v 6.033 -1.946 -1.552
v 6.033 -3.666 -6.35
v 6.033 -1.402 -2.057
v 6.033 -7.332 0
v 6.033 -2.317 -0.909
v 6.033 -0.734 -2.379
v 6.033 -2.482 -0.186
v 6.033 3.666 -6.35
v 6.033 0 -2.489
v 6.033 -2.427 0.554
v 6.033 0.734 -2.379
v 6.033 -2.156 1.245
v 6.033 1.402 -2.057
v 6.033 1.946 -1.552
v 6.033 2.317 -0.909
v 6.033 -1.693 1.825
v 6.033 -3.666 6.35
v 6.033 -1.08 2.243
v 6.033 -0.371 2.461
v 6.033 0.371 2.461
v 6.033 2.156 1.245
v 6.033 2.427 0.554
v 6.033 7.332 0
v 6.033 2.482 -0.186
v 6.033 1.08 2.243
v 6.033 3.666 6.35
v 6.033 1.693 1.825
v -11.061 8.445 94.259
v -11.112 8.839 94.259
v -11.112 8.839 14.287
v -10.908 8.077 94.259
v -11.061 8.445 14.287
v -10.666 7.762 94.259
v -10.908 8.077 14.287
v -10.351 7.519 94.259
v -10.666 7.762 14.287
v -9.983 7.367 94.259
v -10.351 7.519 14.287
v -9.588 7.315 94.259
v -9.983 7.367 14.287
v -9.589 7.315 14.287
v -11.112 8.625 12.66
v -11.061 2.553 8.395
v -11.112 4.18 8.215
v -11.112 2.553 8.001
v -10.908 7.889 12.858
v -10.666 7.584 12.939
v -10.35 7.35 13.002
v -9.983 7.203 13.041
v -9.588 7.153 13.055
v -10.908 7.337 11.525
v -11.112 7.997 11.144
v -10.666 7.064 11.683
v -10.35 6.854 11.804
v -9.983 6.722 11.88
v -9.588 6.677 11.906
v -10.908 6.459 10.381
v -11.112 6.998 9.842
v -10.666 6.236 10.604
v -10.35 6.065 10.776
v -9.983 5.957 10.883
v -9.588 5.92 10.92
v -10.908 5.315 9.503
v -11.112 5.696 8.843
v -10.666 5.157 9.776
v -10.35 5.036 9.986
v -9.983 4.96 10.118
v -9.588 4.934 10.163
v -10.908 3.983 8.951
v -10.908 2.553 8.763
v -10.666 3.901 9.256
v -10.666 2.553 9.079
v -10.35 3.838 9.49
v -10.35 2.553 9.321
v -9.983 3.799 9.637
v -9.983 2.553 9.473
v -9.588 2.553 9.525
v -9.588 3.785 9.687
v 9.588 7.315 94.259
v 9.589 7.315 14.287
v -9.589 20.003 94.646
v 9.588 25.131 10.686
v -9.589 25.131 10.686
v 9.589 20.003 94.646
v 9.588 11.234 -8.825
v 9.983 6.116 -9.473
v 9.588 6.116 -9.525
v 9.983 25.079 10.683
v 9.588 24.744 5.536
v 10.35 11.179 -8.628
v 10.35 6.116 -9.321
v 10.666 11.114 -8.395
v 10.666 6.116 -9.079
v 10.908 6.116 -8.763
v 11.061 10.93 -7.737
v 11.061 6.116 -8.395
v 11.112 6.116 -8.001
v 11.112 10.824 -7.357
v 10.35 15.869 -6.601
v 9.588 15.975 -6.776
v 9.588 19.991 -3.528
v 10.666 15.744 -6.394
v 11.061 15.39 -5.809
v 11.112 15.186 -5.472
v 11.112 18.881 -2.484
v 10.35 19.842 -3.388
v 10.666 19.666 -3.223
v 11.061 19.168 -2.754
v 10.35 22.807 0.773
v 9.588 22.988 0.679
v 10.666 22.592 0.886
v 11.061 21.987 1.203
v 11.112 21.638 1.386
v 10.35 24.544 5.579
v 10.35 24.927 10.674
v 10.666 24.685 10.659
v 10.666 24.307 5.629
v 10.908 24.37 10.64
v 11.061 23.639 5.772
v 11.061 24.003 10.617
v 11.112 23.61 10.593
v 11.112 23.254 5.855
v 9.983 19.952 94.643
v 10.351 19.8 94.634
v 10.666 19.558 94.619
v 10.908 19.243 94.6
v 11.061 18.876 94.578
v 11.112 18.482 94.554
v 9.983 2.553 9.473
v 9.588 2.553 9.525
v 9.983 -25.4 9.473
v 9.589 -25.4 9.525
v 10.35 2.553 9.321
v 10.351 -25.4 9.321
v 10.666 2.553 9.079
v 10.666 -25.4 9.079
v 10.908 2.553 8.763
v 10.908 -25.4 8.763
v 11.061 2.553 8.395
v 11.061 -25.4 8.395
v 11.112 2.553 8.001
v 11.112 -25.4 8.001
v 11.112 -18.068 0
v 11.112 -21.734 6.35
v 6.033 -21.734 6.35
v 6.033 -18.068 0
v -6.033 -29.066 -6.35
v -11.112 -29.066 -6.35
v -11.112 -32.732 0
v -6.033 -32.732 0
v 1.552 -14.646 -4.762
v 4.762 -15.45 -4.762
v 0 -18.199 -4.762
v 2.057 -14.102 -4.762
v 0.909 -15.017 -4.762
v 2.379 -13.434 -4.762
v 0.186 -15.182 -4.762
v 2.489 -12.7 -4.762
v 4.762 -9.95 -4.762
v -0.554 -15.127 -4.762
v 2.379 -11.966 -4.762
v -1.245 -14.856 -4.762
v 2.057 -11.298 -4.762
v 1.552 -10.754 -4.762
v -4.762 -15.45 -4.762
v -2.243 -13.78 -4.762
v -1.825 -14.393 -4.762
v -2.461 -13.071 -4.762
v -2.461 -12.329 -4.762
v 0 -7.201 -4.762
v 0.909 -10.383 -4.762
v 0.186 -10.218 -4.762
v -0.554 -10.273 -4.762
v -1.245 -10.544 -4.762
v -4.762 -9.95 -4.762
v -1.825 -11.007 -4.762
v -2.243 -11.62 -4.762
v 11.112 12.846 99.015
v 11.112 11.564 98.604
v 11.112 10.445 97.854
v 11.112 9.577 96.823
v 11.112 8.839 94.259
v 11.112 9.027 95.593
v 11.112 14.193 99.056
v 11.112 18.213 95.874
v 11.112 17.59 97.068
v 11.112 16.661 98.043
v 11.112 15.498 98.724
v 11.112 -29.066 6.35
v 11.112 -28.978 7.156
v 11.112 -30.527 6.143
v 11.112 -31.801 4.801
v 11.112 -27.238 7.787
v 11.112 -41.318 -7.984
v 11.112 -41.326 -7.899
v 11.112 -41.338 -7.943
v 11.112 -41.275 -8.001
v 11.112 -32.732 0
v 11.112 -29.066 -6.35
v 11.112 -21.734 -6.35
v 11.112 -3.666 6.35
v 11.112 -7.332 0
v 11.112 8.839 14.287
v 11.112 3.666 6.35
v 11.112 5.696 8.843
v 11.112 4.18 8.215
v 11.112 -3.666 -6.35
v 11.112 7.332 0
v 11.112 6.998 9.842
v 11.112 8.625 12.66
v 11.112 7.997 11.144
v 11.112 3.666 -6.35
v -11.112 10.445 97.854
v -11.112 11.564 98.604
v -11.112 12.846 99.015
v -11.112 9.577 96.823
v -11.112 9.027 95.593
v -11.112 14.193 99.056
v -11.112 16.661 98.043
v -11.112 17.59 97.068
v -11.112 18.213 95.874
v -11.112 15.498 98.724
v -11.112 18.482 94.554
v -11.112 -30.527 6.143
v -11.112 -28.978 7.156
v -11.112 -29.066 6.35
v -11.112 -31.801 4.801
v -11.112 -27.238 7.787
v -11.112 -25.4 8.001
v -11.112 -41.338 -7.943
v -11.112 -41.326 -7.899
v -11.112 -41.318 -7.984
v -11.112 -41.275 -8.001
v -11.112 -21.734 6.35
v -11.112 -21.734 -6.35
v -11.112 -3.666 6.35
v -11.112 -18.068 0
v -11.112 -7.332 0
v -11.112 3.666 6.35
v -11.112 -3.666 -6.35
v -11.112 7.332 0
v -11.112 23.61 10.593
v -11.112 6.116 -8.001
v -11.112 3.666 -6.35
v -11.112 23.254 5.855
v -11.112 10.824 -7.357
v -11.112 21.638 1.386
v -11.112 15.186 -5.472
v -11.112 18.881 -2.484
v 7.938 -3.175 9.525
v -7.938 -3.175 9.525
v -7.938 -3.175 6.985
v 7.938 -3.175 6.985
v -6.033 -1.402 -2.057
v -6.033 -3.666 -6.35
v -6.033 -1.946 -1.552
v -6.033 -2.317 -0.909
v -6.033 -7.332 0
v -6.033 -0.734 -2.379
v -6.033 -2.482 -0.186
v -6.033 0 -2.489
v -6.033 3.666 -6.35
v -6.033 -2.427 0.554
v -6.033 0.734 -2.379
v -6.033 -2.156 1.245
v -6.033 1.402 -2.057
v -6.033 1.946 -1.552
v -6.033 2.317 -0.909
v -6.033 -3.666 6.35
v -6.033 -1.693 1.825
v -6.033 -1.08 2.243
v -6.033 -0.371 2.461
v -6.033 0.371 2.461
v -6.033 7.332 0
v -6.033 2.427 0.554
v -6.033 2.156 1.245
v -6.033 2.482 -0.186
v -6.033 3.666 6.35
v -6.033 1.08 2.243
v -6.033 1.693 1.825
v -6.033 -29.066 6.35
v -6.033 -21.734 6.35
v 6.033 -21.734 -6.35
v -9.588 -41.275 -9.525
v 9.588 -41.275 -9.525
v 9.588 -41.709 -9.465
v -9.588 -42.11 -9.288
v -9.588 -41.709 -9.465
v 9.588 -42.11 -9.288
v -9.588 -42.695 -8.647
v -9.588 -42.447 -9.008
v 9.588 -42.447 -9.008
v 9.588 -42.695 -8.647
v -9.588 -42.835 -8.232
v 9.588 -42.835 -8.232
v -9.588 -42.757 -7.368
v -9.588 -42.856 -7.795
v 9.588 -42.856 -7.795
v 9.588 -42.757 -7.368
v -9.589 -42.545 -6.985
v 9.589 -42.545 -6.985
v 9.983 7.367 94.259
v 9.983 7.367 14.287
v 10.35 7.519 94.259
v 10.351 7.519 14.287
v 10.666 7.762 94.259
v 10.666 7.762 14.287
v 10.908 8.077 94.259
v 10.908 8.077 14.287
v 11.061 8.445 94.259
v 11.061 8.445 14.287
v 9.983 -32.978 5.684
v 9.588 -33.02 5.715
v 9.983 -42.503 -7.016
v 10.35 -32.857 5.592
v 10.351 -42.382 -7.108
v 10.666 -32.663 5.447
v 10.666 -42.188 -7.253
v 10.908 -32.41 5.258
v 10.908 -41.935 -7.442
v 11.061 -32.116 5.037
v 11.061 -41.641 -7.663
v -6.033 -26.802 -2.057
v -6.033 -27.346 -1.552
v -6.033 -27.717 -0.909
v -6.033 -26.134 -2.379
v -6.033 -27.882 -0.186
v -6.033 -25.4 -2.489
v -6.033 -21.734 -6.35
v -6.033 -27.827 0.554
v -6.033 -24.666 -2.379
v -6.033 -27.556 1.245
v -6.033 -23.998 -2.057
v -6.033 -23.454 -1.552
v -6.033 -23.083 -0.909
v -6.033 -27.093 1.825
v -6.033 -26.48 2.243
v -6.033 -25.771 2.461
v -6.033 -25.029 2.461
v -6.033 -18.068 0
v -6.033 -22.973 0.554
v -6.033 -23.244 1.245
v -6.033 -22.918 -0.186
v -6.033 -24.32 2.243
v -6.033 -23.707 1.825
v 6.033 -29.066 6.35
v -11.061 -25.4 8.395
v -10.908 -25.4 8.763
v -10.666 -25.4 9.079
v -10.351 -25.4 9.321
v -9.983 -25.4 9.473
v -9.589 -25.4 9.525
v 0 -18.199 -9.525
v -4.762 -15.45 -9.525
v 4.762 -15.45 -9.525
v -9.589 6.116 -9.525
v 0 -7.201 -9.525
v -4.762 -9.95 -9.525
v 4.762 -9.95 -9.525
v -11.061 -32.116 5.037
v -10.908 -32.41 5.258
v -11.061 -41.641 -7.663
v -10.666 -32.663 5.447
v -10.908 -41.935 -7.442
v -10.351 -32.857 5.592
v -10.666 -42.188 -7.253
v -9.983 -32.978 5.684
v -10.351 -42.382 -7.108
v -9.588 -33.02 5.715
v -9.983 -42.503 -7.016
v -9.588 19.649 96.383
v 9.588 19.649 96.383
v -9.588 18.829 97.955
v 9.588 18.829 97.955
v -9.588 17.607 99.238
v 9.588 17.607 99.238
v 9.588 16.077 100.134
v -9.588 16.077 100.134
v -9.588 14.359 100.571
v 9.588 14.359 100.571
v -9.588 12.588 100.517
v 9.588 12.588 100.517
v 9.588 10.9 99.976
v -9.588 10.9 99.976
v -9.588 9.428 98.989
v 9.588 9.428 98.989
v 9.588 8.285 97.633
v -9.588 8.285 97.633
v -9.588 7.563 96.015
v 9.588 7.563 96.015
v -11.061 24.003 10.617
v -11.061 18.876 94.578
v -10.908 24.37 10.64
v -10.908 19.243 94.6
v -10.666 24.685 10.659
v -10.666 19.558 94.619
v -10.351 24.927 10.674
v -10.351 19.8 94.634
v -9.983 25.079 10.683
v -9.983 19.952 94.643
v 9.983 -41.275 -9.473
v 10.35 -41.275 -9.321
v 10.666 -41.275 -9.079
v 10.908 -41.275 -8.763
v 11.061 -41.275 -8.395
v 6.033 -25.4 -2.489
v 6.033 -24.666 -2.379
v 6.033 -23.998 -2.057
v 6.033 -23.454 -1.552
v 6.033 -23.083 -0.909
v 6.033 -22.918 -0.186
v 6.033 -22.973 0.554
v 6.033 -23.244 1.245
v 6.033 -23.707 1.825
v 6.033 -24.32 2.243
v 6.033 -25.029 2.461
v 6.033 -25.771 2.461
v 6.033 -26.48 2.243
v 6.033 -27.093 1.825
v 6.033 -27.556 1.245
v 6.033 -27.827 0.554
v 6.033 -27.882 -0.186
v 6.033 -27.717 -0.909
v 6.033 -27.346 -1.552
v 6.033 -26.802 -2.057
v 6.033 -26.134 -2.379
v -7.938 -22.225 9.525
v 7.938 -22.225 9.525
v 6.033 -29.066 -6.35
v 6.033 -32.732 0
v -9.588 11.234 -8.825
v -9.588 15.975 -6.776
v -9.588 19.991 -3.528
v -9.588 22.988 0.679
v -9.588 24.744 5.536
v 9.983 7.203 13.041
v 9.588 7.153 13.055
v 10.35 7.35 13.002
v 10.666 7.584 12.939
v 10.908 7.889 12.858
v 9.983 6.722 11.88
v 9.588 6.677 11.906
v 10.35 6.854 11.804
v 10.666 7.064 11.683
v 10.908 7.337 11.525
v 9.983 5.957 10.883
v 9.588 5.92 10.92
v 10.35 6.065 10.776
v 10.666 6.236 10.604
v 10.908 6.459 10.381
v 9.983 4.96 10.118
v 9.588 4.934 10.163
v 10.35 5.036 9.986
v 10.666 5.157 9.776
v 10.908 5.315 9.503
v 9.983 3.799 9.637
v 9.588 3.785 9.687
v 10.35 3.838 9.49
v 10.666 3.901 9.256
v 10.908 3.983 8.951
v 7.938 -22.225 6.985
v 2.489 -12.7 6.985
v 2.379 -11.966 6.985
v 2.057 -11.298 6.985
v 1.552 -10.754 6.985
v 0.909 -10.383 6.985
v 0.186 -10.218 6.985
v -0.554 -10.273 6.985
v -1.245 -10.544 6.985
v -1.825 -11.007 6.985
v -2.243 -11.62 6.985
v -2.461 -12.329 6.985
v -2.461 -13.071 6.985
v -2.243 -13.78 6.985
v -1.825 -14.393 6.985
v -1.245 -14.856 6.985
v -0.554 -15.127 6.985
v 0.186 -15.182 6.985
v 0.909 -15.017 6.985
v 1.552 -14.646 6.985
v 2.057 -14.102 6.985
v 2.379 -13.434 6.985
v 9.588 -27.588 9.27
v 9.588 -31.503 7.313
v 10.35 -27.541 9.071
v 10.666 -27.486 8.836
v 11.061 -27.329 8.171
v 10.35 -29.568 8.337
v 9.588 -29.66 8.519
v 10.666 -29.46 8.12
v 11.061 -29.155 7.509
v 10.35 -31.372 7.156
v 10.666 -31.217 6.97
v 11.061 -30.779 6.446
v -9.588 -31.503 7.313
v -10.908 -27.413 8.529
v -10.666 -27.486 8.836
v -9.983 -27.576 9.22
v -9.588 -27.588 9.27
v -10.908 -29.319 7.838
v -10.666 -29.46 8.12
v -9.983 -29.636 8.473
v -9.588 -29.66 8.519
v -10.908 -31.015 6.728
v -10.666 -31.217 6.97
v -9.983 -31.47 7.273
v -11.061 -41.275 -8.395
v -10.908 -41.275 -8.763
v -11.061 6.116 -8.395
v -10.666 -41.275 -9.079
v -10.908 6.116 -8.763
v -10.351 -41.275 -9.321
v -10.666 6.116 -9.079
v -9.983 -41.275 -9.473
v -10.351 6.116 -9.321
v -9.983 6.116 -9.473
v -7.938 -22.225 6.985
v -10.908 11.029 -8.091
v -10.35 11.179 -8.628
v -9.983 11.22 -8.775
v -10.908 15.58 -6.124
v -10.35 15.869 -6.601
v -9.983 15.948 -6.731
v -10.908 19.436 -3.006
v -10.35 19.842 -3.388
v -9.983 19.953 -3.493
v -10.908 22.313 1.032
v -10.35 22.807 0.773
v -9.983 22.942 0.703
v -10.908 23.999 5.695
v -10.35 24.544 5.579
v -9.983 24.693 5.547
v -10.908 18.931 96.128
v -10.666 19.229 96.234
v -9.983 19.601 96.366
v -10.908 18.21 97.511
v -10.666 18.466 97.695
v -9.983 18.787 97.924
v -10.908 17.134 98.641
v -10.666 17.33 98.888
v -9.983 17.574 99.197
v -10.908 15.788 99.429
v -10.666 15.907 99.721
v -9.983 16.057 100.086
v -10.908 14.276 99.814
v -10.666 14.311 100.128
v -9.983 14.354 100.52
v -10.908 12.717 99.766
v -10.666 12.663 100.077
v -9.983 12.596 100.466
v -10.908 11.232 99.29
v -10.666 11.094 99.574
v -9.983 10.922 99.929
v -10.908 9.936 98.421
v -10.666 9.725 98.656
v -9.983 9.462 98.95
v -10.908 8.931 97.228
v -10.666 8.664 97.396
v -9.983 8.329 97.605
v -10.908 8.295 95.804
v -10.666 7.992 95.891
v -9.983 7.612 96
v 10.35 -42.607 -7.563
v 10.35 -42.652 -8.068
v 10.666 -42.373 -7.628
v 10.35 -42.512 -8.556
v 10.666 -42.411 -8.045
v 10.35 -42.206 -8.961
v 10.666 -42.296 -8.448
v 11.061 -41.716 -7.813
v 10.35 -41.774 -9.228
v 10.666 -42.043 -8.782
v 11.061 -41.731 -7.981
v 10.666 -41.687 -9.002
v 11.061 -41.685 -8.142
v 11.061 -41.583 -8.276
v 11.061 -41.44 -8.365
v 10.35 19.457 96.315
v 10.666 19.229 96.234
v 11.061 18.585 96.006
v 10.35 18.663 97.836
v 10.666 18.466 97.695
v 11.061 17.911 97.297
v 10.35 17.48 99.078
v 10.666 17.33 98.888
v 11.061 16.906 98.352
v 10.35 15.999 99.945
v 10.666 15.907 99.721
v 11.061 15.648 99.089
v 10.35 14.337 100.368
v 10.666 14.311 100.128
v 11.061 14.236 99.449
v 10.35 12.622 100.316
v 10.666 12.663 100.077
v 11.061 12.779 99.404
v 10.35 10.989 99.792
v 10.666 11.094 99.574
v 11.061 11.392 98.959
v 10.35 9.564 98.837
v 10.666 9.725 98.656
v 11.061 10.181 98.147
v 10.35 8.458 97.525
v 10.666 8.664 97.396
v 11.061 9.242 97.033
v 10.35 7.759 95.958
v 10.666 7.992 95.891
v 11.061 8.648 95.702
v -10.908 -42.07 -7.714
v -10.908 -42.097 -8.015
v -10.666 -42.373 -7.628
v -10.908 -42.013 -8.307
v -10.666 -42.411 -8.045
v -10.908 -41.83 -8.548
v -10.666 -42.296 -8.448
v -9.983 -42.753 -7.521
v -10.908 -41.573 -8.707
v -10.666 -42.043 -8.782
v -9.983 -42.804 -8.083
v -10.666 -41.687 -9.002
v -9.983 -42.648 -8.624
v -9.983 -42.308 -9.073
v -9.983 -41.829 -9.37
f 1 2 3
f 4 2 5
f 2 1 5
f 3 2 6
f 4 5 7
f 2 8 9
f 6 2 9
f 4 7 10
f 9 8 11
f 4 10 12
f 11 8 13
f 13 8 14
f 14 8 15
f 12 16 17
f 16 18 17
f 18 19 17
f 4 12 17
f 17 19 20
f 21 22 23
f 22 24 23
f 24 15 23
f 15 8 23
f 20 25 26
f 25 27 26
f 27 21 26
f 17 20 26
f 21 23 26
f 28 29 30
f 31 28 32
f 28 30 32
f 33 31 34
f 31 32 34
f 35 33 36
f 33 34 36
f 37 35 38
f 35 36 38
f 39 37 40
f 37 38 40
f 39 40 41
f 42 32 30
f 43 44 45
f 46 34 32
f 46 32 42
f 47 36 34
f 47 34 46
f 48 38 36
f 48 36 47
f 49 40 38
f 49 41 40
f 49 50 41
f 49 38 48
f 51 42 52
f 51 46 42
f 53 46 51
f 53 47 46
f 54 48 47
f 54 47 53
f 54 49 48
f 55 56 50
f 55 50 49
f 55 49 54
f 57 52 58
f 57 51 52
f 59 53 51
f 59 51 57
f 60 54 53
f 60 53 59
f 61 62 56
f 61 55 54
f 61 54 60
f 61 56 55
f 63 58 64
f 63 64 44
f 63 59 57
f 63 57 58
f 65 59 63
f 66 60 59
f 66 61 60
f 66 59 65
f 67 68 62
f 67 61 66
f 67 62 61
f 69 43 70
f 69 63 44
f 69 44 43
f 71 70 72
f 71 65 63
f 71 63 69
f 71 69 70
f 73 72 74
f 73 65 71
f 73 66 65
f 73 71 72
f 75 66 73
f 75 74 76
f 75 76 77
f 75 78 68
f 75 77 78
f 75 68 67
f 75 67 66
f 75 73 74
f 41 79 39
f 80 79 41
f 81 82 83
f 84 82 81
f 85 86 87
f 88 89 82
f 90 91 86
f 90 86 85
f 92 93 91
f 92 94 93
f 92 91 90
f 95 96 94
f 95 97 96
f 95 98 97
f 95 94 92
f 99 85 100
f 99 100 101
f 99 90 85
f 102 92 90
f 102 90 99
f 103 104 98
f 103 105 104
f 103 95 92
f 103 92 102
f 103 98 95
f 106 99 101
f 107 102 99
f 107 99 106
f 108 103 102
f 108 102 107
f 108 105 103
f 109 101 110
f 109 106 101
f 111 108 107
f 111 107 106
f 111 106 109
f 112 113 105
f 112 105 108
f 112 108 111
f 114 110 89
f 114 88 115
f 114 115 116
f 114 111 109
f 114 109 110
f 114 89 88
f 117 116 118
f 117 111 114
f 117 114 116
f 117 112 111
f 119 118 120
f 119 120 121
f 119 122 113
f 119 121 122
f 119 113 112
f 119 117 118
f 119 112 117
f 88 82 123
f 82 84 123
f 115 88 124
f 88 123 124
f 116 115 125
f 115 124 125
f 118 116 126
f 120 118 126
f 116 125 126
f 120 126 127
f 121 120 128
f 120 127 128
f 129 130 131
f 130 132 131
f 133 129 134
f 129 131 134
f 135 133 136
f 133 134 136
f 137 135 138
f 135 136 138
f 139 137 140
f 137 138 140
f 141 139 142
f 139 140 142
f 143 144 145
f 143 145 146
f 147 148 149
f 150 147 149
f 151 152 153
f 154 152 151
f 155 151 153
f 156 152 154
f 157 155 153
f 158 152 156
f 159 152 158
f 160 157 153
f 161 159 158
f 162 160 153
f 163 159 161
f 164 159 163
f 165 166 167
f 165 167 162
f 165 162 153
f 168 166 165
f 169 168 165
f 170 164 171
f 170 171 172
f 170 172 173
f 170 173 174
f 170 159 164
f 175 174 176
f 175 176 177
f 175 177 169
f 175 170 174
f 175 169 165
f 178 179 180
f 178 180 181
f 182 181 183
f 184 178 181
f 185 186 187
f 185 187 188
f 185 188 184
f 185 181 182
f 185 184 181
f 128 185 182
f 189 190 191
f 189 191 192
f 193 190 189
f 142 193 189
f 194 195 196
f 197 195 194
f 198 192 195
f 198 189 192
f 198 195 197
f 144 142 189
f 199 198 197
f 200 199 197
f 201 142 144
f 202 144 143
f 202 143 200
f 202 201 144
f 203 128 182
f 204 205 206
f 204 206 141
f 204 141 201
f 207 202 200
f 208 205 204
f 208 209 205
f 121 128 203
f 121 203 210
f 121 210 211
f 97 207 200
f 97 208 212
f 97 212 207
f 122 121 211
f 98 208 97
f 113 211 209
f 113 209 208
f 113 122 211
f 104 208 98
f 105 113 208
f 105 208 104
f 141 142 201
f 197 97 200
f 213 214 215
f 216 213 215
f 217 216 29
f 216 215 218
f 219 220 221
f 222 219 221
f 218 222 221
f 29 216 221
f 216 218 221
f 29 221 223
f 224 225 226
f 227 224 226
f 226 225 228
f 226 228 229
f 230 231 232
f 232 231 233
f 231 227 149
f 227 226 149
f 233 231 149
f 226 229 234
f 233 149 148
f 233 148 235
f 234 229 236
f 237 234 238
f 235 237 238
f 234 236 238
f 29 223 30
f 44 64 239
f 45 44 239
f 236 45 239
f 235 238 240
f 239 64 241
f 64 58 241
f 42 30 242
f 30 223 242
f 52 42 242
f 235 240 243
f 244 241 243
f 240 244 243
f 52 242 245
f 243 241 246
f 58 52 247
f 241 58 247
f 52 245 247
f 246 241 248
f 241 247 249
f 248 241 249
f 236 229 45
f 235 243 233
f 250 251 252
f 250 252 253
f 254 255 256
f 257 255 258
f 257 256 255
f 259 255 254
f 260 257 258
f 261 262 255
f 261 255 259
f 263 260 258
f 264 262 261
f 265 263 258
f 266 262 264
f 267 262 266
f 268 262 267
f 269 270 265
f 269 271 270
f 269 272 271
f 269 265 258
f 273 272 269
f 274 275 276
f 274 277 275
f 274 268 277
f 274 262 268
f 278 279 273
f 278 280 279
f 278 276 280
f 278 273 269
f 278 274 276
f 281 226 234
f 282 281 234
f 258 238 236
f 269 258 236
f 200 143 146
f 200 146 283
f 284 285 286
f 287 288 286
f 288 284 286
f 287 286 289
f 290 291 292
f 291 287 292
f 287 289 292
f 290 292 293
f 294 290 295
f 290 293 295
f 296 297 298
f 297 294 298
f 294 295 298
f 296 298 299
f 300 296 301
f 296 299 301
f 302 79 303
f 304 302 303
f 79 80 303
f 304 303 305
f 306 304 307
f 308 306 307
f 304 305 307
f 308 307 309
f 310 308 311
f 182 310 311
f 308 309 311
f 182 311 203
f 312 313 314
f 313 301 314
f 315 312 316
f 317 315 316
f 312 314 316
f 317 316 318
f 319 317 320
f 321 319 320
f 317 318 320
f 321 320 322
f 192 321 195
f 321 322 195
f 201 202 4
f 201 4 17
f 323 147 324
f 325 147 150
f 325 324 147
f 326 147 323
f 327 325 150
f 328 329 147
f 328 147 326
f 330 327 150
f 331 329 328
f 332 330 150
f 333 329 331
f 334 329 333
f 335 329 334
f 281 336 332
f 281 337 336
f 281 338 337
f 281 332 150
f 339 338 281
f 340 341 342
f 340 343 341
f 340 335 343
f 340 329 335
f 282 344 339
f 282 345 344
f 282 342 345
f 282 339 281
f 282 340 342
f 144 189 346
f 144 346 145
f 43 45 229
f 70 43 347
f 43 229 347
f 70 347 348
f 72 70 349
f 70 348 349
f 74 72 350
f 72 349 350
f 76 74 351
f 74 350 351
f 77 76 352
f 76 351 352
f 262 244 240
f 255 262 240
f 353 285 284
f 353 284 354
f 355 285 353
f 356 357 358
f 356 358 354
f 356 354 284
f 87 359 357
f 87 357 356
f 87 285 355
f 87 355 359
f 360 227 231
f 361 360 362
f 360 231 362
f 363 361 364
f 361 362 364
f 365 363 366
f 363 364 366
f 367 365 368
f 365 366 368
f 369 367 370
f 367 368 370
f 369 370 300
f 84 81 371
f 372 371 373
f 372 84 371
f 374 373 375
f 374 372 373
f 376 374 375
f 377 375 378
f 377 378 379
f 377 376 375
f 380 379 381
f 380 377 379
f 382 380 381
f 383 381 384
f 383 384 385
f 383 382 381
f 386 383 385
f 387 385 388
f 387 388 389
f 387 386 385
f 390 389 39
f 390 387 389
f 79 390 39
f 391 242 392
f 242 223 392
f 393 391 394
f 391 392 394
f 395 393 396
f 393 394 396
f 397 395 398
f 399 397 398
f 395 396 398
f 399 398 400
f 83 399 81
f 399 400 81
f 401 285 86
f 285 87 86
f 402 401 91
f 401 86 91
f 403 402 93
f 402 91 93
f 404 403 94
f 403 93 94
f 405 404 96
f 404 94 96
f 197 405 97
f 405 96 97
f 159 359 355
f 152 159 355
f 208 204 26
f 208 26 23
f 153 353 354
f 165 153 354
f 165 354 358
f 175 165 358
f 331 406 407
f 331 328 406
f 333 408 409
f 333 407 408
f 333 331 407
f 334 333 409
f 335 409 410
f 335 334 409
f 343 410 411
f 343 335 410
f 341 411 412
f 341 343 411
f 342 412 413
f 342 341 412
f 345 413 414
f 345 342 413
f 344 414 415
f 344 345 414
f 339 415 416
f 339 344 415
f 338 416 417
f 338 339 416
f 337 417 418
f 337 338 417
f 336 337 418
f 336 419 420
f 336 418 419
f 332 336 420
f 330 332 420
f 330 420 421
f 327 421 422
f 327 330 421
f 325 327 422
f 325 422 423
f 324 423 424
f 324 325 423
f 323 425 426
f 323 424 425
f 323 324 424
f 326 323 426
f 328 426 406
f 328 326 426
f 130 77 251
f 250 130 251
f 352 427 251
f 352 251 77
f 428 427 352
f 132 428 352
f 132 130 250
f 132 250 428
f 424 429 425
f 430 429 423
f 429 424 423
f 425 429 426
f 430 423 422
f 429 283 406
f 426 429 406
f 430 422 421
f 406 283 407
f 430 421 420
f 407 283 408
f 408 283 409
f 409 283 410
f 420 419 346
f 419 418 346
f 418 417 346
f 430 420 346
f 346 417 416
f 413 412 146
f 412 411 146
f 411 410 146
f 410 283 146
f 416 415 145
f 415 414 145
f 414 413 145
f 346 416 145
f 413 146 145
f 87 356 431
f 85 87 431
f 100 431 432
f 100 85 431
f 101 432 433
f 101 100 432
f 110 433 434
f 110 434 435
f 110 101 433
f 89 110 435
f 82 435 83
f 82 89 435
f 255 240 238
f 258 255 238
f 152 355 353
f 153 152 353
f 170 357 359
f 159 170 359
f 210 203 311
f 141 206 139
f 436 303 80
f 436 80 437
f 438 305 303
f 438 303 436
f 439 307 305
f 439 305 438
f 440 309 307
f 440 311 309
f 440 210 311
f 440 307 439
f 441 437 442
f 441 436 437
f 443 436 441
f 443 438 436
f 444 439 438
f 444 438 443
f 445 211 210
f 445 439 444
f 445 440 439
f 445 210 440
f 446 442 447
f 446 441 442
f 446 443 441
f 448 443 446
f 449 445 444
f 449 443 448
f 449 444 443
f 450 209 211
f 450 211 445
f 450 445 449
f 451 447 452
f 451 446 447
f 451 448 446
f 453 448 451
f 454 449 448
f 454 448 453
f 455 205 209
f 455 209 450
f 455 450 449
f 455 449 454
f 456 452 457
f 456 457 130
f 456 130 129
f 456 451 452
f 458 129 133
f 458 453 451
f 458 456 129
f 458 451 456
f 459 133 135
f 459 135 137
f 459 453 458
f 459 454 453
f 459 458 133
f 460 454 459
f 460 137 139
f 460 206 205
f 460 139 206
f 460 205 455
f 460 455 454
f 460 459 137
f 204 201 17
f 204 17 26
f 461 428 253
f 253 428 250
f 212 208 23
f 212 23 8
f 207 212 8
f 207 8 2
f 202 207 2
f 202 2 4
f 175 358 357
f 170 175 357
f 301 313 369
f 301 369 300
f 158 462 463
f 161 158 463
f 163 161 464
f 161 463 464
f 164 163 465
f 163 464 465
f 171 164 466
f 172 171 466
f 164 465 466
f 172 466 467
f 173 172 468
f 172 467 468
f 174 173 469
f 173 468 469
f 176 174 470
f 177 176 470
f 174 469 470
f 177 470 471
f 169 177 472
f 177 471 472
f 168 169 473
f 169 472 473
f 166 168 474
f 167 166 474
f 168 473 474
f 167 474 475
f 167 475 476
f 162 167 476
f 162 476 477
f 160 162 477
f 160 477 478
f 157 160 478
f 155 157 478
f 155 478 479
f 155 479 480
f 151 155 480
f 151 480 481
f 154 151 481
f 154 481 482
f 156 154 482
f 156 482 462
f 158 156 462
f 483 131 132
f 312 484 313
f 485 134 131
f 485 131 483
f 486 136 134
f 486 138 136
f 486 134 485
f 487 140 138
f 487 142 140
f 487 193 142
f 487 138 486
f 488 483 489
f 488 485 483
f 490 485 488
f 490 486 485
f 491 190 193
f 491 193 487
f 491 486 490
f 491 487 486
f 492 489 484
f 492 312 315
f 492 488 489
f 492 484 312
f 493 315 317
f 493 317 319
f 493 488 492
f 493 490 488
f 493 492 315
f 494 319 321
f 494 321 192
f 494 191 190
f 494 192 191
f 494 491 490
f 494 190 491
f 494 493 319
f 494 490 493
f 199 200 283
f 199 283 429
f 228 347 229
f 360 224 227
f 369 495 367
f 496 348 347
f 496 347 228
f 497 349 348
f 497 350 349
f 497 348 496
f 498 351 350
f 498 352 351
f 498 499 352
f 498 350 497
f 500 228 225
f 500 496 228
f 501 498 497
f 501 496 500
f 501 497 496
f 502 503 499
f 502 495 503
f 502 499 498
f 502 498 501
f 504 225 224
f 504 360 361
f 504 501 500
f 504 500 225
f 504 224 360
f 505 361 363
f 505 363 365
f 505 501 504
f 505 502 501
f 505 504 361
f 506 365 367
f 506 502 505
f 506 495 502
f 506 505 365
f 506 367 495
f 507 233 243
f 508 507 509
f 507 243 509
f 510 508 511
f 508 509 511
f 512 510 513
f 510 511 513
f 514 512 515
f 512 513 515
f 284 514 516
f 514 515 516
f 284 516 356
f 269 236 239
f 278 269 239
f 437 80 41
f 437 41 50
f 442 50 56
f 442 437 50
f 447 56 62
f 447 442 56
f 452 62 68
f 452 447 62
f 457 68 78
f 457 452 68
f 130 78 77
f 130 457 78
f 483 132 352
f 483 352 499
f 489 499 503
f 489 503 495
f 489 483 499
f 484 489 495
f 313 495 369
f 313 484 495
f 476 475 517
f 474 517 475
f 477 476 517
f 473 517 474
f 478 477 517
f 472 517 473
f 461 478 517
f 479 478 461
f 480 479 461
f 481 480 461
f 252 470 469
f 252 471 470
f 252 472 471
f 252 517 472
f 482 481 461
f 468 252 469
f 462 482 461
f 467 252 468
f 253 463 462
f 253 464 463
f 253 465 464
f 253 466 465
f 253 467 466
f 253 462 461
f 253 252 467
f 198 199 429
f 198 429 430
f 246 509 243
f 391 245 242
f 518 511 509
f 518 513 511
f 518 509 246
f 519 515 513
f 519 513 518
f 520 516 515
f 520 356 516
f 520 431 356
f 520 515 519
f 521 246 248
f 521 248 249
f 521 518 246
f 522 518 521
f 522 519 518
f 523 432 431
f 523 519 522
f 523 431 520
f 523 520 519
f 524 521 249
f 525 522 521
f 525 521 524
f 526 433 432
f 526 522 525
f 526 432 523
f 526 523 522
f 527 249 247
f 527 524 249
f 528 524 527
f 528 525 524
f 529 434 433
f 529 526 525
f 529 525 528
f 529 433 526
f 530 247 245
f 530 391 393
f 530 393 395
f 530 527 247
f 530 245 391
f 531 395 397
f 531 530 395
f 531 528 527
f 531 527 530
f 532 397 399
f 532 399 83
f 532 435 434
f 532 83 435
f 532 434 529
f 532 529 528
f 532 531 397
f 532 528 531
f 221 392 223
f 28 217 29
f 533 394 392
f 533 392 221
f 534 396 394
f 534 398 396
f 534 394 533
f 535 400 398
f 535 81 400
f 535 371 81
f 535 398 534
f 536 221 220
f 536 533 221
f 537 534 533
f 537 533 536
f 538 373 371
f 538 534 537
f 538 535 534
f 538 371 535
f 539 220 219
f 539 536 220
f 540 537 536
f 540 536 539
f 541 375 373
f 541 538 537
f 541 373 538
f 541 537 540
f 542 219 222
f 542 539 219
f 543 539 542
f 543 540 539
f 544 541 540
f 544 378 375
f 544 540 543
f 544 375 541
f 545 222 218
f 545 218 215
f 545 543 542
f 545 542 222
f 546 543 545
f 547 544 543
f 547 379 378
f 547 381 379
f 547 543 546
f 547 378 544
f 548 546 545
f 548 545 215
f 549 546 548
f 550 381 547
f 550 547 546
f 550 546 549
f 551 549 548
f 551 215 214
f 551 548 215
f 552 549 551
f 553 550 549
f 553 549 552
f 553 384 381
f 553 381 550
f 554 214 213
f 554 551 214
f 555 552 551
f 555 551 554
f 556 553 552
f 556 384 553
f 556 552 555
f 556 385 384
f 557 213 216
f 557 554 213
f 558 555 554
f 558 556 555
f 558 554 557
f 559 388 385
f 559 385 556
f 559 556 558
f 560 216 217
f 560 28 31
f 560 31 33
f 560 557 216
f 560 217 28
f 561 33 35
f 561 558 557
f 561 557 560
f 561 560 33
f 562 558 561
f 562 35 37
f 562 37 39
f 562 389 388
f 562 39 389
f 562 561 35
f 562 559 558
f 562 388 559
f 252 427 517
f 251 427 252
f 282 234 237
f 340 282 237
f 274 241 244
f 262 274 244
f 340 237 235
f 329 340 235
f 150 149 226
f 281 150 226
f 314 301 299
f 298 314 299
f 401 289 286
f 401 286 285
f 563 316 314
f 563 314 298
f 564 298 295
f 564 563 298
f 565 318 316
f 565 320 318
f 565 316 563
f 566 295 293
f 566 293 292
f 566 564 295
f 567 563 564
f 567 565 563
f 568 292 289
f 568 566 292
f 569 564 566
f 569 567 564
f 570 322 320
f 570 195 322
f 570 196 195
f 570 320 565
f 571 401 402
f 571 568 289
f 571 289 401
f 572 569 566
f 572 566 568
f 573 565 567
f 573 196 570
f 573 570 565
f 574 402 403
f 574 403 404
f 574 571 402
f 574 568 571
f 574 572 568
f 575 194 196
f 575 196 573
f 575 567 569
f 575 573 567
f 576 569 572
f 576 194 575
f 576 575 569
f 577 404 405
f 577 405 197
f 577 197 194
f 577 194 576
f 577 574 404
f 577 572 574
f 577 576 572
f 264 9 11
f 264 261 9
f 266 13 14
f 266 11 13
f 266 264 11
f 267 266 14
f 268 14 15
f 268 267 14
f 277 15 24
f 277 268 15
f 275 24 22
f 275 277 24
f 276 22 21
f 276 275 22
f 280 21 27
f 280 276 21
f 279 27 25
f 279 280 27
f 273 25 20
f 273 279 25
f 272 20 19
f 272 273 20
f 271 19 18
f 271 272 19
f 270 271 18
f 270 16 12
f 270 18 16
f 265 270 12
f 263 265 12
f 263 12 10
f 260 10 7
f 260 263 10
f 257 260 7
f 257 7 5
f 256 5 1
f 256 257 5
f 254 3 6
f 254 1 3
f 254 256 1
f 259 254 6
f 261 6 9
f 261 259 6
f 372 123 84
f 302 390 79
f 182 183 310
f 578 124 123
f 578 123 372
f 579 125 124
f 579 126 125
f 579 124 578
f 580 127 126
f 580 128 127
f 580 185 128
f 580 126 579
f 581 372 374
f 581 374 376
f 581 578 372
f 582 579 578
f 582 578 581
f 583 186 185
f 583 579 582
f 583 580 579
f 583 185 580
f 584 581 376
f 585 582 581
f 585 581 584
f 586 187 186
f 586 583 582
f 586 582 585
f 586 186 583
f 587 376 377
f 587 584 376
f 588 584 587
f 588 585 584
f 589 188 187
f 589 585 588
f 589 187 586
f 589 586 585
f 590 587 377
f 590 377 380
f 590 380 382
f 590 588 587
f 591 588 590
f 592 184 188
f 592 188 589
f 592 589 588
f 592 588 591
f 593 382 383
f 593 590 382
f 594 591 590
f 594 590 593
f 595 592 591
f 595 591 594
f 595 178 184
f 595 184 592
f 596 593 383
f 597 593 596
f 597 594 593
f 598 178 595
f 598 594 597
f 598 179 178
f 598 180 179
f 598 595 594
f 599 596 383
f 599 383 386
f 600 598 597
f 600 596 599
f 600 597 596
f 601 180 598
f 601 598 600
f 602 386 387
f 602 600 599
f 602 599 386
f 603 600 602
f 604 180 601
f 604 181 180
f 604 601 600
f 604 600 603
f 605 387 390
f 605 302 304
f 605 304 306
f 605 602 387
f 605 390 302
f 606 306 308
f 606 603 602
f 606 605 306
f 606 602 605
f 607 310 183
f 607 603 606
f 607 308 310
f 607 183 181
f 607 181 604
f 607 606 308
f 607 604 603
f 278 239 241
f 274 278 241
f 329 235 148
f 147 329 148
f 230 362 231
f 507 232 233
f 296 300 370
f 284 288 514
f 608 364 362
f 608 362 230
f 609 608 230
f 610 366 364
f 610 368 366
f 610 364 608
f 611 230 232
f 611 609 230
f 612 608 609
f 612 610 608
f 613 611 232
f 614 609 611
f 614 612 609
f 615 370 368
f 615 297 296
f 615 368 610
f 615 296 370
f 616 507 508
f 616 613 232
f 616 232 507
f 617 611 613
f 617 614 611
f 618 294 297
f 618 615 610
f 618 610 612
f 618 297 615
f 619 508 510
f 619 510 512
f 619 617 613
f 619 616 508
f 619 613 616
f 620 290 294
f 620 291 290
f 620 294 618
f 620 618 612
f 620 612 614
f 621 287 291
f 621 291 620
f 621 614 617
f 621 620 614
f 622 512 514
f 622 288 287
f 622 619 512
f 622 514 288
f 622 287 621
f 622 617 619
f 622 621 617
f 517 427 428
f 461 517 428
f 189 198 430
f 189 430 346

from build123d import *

# Parameters (mm, degrees)
SKETCH1_R           = 2.4892
BOSS_EXTRUDE1_DEPTH = 11.1125
FILLET1_R           = 1.5875
CUT_EXTRUDE1_DEPTH  = 5.08
SKETCH4_W           = 15.875
SKETCH4_H           = 19.05
CUT_EXTRUDE2_DEPTH  = 2.54
SKETCH5_R           = 2.4892
CUT_EXTRUDE3_DEPTH  = 104.567416874
FILLET2_R           = 1.524
CUT_EXTRUDE4_DEPTH  = 4.7625


with BuildPart() as part:
    # Sketch1 → Boss-Extrude1 (new, symmetric)
    with BuildSketch(Plane(origin=(0, 0, 0), x_dir=(0, 0, -1), z_dir=(1, 0, 0))):
        with BuildLine():
            Line((-9.525, 2.5527), (-9.525, -25.4))
            ThreePointArc((-9.525, -25.4), (-8.519418994, -29.659709497), (-5.715, -33.02))
            Line((-5.715, -33.02), (9.525, -44.45))
            Line((9.525, -44.45), (9.525, 6.116314701))
            ThreePointArc((9.525, 6.116314701), (3.528372392, 19.99118296), (-10.686230362, 25.130889218))
            Line((-10.686230362, 25.130889218), (-94.646476787, 20.003391506))
            ThreePointArc((-94.646476787, 20.003391506), (-100.60644719, 13.471571567), (-94.2594, 7.3152))
            Line((-94.2594, 7.3152), (-14.2875, 7.3152))
            ThreePointArc((-14.2875, 7.3152), (-10.919903955, 5.920296045), (-9.525, 2.5527))
        make_face()
        Circle(SKETCH1_R, mode=Mode.SUBTRACT)
        with Locations((0, -25.4)):
            Circle(SKETCH1_R, mode=Mode.SUBTRACT)
    extrude(amount=BOSS_EXTRUDE1_DEPTH, both=True)

    # Fillet1
    fillet1_edges = [part.edges().sort_by_distance(p)[0] for p in [
        (0, -44.45, -9.525),
    ]]
    fillet(fillet1_edges, radius=FILLET1_R)

    # Sketch3 → Cut-Extrude1 (cut)
    with BuildSketch(Plane.ZY.offset(11.1125)):
        Polygon((0, 7.332348419), (-6.35, 3.666174209), (-6.35, -3.666174209), (0, -7.332348419), (6.35, -3.666174209), (6.35, 3.666174209), align=None)
        Polygon((0, -18.067651581), (-6.35, -21.733825791), (-6.35, -29.066174209), (0, -32.732348419), (6.35, -29.066174209), (6.35, -21.733825791), align=None)
    cut_extrude1 = extrude(amount=-CUT_EXTRUDE1_DEPTH, mode=Mode.SUBTRACT)

    # Mirror1: Cut-Extrude1 across plane
    add(cut_extrude1.mirror(Plane(origin=(0, 0, 0), x_dir=(0, 0, 1), z_dir=(1, 0, 0))), mode=Mode.SUBTRACT)

    # Sketch4 → Cut-Extrude2 (cut)
    with BuildSketch(Plane.XY.offset(9.525)):
        with Locations((0, -12.7)):
            Rectangle(SKETCH4_W, SKETCH4_H)
    extrude(amount=-CUT_EXTRUDE2_DEPTH, mode=Mode.SUBTRACT)

    # Sketch5 → Cut-Extrude3 (cut, through all)
    with BuildSketch(Plane.XY.offset(6.985)):
        with Locations((0, -12.7)):
            Circle(SKETCH5_R)
    extrude(amount=-CUT_EXTRUDE3_DEPTH, mode=Mode.SUBTRACT)

    # Fillet2
    fillet2_edges = [part.edges().sort_by_distance(p)[0] for p in [
        (-11.1125, 22.567140362, 52.666353575),
        (-11.1125, 19.99118296, -3.528372392),
        (-11.1125, -37.7825, -0.635),
        (-11.1125, -29.659709497, 8.519418994),
        (11.1125, 19.99118296, -3.528372392),
        (11.1125, 22.567140362, 52.666353575),
        (11.1125, 13.471571567, 100.60644719),
        (11.1125, 7.3152, 54.27345),
        (11.1125, 5.920296045, 10.919903955),
        (11.1125, -11.42365, 9.525),
        (-11.1125, -17.579342649, -9.525),
        (11.1125, -17.579342649, -9.525),
        (-11.1125, -42.694903166, -8.647451583),
        (11.1125, -42.694903166, -8.647451583),
        (11.1125, -29.659709497, 8.519418994),
        (11.1125, -37.7825, -0.635),
        (-11.1125, -11.42365, 9.525),
        (-11.1125, 5.920296045, 10.919903955),
        (-11.1125, 7.3152, 54.27345),
        (-11.1125, 13.471571567, 100.60644719),
    ]]
    fillet(fillet2_edges, radius=FILLET2_R)

    # Sketch6 → Cut-Extrude4 (cut)
    with BuildSketch(Plane(origin=(0, 0, -9.525), x_dir=(-1, 0, 0), z_dir=(0, 0, -1))):
        Polygon((0, -18.199261314), (4.7625, -15.449630657), (4.7625, -9.950369343), (0, -7.200738686), (-4.7625, -9.950369343), (-4.7625, -15.449630657), align=None)
    extrude(amount=-CUT_EXTRUDE4_DEPTH, mode=Mode.SUBTRACT)


solid = part.part
